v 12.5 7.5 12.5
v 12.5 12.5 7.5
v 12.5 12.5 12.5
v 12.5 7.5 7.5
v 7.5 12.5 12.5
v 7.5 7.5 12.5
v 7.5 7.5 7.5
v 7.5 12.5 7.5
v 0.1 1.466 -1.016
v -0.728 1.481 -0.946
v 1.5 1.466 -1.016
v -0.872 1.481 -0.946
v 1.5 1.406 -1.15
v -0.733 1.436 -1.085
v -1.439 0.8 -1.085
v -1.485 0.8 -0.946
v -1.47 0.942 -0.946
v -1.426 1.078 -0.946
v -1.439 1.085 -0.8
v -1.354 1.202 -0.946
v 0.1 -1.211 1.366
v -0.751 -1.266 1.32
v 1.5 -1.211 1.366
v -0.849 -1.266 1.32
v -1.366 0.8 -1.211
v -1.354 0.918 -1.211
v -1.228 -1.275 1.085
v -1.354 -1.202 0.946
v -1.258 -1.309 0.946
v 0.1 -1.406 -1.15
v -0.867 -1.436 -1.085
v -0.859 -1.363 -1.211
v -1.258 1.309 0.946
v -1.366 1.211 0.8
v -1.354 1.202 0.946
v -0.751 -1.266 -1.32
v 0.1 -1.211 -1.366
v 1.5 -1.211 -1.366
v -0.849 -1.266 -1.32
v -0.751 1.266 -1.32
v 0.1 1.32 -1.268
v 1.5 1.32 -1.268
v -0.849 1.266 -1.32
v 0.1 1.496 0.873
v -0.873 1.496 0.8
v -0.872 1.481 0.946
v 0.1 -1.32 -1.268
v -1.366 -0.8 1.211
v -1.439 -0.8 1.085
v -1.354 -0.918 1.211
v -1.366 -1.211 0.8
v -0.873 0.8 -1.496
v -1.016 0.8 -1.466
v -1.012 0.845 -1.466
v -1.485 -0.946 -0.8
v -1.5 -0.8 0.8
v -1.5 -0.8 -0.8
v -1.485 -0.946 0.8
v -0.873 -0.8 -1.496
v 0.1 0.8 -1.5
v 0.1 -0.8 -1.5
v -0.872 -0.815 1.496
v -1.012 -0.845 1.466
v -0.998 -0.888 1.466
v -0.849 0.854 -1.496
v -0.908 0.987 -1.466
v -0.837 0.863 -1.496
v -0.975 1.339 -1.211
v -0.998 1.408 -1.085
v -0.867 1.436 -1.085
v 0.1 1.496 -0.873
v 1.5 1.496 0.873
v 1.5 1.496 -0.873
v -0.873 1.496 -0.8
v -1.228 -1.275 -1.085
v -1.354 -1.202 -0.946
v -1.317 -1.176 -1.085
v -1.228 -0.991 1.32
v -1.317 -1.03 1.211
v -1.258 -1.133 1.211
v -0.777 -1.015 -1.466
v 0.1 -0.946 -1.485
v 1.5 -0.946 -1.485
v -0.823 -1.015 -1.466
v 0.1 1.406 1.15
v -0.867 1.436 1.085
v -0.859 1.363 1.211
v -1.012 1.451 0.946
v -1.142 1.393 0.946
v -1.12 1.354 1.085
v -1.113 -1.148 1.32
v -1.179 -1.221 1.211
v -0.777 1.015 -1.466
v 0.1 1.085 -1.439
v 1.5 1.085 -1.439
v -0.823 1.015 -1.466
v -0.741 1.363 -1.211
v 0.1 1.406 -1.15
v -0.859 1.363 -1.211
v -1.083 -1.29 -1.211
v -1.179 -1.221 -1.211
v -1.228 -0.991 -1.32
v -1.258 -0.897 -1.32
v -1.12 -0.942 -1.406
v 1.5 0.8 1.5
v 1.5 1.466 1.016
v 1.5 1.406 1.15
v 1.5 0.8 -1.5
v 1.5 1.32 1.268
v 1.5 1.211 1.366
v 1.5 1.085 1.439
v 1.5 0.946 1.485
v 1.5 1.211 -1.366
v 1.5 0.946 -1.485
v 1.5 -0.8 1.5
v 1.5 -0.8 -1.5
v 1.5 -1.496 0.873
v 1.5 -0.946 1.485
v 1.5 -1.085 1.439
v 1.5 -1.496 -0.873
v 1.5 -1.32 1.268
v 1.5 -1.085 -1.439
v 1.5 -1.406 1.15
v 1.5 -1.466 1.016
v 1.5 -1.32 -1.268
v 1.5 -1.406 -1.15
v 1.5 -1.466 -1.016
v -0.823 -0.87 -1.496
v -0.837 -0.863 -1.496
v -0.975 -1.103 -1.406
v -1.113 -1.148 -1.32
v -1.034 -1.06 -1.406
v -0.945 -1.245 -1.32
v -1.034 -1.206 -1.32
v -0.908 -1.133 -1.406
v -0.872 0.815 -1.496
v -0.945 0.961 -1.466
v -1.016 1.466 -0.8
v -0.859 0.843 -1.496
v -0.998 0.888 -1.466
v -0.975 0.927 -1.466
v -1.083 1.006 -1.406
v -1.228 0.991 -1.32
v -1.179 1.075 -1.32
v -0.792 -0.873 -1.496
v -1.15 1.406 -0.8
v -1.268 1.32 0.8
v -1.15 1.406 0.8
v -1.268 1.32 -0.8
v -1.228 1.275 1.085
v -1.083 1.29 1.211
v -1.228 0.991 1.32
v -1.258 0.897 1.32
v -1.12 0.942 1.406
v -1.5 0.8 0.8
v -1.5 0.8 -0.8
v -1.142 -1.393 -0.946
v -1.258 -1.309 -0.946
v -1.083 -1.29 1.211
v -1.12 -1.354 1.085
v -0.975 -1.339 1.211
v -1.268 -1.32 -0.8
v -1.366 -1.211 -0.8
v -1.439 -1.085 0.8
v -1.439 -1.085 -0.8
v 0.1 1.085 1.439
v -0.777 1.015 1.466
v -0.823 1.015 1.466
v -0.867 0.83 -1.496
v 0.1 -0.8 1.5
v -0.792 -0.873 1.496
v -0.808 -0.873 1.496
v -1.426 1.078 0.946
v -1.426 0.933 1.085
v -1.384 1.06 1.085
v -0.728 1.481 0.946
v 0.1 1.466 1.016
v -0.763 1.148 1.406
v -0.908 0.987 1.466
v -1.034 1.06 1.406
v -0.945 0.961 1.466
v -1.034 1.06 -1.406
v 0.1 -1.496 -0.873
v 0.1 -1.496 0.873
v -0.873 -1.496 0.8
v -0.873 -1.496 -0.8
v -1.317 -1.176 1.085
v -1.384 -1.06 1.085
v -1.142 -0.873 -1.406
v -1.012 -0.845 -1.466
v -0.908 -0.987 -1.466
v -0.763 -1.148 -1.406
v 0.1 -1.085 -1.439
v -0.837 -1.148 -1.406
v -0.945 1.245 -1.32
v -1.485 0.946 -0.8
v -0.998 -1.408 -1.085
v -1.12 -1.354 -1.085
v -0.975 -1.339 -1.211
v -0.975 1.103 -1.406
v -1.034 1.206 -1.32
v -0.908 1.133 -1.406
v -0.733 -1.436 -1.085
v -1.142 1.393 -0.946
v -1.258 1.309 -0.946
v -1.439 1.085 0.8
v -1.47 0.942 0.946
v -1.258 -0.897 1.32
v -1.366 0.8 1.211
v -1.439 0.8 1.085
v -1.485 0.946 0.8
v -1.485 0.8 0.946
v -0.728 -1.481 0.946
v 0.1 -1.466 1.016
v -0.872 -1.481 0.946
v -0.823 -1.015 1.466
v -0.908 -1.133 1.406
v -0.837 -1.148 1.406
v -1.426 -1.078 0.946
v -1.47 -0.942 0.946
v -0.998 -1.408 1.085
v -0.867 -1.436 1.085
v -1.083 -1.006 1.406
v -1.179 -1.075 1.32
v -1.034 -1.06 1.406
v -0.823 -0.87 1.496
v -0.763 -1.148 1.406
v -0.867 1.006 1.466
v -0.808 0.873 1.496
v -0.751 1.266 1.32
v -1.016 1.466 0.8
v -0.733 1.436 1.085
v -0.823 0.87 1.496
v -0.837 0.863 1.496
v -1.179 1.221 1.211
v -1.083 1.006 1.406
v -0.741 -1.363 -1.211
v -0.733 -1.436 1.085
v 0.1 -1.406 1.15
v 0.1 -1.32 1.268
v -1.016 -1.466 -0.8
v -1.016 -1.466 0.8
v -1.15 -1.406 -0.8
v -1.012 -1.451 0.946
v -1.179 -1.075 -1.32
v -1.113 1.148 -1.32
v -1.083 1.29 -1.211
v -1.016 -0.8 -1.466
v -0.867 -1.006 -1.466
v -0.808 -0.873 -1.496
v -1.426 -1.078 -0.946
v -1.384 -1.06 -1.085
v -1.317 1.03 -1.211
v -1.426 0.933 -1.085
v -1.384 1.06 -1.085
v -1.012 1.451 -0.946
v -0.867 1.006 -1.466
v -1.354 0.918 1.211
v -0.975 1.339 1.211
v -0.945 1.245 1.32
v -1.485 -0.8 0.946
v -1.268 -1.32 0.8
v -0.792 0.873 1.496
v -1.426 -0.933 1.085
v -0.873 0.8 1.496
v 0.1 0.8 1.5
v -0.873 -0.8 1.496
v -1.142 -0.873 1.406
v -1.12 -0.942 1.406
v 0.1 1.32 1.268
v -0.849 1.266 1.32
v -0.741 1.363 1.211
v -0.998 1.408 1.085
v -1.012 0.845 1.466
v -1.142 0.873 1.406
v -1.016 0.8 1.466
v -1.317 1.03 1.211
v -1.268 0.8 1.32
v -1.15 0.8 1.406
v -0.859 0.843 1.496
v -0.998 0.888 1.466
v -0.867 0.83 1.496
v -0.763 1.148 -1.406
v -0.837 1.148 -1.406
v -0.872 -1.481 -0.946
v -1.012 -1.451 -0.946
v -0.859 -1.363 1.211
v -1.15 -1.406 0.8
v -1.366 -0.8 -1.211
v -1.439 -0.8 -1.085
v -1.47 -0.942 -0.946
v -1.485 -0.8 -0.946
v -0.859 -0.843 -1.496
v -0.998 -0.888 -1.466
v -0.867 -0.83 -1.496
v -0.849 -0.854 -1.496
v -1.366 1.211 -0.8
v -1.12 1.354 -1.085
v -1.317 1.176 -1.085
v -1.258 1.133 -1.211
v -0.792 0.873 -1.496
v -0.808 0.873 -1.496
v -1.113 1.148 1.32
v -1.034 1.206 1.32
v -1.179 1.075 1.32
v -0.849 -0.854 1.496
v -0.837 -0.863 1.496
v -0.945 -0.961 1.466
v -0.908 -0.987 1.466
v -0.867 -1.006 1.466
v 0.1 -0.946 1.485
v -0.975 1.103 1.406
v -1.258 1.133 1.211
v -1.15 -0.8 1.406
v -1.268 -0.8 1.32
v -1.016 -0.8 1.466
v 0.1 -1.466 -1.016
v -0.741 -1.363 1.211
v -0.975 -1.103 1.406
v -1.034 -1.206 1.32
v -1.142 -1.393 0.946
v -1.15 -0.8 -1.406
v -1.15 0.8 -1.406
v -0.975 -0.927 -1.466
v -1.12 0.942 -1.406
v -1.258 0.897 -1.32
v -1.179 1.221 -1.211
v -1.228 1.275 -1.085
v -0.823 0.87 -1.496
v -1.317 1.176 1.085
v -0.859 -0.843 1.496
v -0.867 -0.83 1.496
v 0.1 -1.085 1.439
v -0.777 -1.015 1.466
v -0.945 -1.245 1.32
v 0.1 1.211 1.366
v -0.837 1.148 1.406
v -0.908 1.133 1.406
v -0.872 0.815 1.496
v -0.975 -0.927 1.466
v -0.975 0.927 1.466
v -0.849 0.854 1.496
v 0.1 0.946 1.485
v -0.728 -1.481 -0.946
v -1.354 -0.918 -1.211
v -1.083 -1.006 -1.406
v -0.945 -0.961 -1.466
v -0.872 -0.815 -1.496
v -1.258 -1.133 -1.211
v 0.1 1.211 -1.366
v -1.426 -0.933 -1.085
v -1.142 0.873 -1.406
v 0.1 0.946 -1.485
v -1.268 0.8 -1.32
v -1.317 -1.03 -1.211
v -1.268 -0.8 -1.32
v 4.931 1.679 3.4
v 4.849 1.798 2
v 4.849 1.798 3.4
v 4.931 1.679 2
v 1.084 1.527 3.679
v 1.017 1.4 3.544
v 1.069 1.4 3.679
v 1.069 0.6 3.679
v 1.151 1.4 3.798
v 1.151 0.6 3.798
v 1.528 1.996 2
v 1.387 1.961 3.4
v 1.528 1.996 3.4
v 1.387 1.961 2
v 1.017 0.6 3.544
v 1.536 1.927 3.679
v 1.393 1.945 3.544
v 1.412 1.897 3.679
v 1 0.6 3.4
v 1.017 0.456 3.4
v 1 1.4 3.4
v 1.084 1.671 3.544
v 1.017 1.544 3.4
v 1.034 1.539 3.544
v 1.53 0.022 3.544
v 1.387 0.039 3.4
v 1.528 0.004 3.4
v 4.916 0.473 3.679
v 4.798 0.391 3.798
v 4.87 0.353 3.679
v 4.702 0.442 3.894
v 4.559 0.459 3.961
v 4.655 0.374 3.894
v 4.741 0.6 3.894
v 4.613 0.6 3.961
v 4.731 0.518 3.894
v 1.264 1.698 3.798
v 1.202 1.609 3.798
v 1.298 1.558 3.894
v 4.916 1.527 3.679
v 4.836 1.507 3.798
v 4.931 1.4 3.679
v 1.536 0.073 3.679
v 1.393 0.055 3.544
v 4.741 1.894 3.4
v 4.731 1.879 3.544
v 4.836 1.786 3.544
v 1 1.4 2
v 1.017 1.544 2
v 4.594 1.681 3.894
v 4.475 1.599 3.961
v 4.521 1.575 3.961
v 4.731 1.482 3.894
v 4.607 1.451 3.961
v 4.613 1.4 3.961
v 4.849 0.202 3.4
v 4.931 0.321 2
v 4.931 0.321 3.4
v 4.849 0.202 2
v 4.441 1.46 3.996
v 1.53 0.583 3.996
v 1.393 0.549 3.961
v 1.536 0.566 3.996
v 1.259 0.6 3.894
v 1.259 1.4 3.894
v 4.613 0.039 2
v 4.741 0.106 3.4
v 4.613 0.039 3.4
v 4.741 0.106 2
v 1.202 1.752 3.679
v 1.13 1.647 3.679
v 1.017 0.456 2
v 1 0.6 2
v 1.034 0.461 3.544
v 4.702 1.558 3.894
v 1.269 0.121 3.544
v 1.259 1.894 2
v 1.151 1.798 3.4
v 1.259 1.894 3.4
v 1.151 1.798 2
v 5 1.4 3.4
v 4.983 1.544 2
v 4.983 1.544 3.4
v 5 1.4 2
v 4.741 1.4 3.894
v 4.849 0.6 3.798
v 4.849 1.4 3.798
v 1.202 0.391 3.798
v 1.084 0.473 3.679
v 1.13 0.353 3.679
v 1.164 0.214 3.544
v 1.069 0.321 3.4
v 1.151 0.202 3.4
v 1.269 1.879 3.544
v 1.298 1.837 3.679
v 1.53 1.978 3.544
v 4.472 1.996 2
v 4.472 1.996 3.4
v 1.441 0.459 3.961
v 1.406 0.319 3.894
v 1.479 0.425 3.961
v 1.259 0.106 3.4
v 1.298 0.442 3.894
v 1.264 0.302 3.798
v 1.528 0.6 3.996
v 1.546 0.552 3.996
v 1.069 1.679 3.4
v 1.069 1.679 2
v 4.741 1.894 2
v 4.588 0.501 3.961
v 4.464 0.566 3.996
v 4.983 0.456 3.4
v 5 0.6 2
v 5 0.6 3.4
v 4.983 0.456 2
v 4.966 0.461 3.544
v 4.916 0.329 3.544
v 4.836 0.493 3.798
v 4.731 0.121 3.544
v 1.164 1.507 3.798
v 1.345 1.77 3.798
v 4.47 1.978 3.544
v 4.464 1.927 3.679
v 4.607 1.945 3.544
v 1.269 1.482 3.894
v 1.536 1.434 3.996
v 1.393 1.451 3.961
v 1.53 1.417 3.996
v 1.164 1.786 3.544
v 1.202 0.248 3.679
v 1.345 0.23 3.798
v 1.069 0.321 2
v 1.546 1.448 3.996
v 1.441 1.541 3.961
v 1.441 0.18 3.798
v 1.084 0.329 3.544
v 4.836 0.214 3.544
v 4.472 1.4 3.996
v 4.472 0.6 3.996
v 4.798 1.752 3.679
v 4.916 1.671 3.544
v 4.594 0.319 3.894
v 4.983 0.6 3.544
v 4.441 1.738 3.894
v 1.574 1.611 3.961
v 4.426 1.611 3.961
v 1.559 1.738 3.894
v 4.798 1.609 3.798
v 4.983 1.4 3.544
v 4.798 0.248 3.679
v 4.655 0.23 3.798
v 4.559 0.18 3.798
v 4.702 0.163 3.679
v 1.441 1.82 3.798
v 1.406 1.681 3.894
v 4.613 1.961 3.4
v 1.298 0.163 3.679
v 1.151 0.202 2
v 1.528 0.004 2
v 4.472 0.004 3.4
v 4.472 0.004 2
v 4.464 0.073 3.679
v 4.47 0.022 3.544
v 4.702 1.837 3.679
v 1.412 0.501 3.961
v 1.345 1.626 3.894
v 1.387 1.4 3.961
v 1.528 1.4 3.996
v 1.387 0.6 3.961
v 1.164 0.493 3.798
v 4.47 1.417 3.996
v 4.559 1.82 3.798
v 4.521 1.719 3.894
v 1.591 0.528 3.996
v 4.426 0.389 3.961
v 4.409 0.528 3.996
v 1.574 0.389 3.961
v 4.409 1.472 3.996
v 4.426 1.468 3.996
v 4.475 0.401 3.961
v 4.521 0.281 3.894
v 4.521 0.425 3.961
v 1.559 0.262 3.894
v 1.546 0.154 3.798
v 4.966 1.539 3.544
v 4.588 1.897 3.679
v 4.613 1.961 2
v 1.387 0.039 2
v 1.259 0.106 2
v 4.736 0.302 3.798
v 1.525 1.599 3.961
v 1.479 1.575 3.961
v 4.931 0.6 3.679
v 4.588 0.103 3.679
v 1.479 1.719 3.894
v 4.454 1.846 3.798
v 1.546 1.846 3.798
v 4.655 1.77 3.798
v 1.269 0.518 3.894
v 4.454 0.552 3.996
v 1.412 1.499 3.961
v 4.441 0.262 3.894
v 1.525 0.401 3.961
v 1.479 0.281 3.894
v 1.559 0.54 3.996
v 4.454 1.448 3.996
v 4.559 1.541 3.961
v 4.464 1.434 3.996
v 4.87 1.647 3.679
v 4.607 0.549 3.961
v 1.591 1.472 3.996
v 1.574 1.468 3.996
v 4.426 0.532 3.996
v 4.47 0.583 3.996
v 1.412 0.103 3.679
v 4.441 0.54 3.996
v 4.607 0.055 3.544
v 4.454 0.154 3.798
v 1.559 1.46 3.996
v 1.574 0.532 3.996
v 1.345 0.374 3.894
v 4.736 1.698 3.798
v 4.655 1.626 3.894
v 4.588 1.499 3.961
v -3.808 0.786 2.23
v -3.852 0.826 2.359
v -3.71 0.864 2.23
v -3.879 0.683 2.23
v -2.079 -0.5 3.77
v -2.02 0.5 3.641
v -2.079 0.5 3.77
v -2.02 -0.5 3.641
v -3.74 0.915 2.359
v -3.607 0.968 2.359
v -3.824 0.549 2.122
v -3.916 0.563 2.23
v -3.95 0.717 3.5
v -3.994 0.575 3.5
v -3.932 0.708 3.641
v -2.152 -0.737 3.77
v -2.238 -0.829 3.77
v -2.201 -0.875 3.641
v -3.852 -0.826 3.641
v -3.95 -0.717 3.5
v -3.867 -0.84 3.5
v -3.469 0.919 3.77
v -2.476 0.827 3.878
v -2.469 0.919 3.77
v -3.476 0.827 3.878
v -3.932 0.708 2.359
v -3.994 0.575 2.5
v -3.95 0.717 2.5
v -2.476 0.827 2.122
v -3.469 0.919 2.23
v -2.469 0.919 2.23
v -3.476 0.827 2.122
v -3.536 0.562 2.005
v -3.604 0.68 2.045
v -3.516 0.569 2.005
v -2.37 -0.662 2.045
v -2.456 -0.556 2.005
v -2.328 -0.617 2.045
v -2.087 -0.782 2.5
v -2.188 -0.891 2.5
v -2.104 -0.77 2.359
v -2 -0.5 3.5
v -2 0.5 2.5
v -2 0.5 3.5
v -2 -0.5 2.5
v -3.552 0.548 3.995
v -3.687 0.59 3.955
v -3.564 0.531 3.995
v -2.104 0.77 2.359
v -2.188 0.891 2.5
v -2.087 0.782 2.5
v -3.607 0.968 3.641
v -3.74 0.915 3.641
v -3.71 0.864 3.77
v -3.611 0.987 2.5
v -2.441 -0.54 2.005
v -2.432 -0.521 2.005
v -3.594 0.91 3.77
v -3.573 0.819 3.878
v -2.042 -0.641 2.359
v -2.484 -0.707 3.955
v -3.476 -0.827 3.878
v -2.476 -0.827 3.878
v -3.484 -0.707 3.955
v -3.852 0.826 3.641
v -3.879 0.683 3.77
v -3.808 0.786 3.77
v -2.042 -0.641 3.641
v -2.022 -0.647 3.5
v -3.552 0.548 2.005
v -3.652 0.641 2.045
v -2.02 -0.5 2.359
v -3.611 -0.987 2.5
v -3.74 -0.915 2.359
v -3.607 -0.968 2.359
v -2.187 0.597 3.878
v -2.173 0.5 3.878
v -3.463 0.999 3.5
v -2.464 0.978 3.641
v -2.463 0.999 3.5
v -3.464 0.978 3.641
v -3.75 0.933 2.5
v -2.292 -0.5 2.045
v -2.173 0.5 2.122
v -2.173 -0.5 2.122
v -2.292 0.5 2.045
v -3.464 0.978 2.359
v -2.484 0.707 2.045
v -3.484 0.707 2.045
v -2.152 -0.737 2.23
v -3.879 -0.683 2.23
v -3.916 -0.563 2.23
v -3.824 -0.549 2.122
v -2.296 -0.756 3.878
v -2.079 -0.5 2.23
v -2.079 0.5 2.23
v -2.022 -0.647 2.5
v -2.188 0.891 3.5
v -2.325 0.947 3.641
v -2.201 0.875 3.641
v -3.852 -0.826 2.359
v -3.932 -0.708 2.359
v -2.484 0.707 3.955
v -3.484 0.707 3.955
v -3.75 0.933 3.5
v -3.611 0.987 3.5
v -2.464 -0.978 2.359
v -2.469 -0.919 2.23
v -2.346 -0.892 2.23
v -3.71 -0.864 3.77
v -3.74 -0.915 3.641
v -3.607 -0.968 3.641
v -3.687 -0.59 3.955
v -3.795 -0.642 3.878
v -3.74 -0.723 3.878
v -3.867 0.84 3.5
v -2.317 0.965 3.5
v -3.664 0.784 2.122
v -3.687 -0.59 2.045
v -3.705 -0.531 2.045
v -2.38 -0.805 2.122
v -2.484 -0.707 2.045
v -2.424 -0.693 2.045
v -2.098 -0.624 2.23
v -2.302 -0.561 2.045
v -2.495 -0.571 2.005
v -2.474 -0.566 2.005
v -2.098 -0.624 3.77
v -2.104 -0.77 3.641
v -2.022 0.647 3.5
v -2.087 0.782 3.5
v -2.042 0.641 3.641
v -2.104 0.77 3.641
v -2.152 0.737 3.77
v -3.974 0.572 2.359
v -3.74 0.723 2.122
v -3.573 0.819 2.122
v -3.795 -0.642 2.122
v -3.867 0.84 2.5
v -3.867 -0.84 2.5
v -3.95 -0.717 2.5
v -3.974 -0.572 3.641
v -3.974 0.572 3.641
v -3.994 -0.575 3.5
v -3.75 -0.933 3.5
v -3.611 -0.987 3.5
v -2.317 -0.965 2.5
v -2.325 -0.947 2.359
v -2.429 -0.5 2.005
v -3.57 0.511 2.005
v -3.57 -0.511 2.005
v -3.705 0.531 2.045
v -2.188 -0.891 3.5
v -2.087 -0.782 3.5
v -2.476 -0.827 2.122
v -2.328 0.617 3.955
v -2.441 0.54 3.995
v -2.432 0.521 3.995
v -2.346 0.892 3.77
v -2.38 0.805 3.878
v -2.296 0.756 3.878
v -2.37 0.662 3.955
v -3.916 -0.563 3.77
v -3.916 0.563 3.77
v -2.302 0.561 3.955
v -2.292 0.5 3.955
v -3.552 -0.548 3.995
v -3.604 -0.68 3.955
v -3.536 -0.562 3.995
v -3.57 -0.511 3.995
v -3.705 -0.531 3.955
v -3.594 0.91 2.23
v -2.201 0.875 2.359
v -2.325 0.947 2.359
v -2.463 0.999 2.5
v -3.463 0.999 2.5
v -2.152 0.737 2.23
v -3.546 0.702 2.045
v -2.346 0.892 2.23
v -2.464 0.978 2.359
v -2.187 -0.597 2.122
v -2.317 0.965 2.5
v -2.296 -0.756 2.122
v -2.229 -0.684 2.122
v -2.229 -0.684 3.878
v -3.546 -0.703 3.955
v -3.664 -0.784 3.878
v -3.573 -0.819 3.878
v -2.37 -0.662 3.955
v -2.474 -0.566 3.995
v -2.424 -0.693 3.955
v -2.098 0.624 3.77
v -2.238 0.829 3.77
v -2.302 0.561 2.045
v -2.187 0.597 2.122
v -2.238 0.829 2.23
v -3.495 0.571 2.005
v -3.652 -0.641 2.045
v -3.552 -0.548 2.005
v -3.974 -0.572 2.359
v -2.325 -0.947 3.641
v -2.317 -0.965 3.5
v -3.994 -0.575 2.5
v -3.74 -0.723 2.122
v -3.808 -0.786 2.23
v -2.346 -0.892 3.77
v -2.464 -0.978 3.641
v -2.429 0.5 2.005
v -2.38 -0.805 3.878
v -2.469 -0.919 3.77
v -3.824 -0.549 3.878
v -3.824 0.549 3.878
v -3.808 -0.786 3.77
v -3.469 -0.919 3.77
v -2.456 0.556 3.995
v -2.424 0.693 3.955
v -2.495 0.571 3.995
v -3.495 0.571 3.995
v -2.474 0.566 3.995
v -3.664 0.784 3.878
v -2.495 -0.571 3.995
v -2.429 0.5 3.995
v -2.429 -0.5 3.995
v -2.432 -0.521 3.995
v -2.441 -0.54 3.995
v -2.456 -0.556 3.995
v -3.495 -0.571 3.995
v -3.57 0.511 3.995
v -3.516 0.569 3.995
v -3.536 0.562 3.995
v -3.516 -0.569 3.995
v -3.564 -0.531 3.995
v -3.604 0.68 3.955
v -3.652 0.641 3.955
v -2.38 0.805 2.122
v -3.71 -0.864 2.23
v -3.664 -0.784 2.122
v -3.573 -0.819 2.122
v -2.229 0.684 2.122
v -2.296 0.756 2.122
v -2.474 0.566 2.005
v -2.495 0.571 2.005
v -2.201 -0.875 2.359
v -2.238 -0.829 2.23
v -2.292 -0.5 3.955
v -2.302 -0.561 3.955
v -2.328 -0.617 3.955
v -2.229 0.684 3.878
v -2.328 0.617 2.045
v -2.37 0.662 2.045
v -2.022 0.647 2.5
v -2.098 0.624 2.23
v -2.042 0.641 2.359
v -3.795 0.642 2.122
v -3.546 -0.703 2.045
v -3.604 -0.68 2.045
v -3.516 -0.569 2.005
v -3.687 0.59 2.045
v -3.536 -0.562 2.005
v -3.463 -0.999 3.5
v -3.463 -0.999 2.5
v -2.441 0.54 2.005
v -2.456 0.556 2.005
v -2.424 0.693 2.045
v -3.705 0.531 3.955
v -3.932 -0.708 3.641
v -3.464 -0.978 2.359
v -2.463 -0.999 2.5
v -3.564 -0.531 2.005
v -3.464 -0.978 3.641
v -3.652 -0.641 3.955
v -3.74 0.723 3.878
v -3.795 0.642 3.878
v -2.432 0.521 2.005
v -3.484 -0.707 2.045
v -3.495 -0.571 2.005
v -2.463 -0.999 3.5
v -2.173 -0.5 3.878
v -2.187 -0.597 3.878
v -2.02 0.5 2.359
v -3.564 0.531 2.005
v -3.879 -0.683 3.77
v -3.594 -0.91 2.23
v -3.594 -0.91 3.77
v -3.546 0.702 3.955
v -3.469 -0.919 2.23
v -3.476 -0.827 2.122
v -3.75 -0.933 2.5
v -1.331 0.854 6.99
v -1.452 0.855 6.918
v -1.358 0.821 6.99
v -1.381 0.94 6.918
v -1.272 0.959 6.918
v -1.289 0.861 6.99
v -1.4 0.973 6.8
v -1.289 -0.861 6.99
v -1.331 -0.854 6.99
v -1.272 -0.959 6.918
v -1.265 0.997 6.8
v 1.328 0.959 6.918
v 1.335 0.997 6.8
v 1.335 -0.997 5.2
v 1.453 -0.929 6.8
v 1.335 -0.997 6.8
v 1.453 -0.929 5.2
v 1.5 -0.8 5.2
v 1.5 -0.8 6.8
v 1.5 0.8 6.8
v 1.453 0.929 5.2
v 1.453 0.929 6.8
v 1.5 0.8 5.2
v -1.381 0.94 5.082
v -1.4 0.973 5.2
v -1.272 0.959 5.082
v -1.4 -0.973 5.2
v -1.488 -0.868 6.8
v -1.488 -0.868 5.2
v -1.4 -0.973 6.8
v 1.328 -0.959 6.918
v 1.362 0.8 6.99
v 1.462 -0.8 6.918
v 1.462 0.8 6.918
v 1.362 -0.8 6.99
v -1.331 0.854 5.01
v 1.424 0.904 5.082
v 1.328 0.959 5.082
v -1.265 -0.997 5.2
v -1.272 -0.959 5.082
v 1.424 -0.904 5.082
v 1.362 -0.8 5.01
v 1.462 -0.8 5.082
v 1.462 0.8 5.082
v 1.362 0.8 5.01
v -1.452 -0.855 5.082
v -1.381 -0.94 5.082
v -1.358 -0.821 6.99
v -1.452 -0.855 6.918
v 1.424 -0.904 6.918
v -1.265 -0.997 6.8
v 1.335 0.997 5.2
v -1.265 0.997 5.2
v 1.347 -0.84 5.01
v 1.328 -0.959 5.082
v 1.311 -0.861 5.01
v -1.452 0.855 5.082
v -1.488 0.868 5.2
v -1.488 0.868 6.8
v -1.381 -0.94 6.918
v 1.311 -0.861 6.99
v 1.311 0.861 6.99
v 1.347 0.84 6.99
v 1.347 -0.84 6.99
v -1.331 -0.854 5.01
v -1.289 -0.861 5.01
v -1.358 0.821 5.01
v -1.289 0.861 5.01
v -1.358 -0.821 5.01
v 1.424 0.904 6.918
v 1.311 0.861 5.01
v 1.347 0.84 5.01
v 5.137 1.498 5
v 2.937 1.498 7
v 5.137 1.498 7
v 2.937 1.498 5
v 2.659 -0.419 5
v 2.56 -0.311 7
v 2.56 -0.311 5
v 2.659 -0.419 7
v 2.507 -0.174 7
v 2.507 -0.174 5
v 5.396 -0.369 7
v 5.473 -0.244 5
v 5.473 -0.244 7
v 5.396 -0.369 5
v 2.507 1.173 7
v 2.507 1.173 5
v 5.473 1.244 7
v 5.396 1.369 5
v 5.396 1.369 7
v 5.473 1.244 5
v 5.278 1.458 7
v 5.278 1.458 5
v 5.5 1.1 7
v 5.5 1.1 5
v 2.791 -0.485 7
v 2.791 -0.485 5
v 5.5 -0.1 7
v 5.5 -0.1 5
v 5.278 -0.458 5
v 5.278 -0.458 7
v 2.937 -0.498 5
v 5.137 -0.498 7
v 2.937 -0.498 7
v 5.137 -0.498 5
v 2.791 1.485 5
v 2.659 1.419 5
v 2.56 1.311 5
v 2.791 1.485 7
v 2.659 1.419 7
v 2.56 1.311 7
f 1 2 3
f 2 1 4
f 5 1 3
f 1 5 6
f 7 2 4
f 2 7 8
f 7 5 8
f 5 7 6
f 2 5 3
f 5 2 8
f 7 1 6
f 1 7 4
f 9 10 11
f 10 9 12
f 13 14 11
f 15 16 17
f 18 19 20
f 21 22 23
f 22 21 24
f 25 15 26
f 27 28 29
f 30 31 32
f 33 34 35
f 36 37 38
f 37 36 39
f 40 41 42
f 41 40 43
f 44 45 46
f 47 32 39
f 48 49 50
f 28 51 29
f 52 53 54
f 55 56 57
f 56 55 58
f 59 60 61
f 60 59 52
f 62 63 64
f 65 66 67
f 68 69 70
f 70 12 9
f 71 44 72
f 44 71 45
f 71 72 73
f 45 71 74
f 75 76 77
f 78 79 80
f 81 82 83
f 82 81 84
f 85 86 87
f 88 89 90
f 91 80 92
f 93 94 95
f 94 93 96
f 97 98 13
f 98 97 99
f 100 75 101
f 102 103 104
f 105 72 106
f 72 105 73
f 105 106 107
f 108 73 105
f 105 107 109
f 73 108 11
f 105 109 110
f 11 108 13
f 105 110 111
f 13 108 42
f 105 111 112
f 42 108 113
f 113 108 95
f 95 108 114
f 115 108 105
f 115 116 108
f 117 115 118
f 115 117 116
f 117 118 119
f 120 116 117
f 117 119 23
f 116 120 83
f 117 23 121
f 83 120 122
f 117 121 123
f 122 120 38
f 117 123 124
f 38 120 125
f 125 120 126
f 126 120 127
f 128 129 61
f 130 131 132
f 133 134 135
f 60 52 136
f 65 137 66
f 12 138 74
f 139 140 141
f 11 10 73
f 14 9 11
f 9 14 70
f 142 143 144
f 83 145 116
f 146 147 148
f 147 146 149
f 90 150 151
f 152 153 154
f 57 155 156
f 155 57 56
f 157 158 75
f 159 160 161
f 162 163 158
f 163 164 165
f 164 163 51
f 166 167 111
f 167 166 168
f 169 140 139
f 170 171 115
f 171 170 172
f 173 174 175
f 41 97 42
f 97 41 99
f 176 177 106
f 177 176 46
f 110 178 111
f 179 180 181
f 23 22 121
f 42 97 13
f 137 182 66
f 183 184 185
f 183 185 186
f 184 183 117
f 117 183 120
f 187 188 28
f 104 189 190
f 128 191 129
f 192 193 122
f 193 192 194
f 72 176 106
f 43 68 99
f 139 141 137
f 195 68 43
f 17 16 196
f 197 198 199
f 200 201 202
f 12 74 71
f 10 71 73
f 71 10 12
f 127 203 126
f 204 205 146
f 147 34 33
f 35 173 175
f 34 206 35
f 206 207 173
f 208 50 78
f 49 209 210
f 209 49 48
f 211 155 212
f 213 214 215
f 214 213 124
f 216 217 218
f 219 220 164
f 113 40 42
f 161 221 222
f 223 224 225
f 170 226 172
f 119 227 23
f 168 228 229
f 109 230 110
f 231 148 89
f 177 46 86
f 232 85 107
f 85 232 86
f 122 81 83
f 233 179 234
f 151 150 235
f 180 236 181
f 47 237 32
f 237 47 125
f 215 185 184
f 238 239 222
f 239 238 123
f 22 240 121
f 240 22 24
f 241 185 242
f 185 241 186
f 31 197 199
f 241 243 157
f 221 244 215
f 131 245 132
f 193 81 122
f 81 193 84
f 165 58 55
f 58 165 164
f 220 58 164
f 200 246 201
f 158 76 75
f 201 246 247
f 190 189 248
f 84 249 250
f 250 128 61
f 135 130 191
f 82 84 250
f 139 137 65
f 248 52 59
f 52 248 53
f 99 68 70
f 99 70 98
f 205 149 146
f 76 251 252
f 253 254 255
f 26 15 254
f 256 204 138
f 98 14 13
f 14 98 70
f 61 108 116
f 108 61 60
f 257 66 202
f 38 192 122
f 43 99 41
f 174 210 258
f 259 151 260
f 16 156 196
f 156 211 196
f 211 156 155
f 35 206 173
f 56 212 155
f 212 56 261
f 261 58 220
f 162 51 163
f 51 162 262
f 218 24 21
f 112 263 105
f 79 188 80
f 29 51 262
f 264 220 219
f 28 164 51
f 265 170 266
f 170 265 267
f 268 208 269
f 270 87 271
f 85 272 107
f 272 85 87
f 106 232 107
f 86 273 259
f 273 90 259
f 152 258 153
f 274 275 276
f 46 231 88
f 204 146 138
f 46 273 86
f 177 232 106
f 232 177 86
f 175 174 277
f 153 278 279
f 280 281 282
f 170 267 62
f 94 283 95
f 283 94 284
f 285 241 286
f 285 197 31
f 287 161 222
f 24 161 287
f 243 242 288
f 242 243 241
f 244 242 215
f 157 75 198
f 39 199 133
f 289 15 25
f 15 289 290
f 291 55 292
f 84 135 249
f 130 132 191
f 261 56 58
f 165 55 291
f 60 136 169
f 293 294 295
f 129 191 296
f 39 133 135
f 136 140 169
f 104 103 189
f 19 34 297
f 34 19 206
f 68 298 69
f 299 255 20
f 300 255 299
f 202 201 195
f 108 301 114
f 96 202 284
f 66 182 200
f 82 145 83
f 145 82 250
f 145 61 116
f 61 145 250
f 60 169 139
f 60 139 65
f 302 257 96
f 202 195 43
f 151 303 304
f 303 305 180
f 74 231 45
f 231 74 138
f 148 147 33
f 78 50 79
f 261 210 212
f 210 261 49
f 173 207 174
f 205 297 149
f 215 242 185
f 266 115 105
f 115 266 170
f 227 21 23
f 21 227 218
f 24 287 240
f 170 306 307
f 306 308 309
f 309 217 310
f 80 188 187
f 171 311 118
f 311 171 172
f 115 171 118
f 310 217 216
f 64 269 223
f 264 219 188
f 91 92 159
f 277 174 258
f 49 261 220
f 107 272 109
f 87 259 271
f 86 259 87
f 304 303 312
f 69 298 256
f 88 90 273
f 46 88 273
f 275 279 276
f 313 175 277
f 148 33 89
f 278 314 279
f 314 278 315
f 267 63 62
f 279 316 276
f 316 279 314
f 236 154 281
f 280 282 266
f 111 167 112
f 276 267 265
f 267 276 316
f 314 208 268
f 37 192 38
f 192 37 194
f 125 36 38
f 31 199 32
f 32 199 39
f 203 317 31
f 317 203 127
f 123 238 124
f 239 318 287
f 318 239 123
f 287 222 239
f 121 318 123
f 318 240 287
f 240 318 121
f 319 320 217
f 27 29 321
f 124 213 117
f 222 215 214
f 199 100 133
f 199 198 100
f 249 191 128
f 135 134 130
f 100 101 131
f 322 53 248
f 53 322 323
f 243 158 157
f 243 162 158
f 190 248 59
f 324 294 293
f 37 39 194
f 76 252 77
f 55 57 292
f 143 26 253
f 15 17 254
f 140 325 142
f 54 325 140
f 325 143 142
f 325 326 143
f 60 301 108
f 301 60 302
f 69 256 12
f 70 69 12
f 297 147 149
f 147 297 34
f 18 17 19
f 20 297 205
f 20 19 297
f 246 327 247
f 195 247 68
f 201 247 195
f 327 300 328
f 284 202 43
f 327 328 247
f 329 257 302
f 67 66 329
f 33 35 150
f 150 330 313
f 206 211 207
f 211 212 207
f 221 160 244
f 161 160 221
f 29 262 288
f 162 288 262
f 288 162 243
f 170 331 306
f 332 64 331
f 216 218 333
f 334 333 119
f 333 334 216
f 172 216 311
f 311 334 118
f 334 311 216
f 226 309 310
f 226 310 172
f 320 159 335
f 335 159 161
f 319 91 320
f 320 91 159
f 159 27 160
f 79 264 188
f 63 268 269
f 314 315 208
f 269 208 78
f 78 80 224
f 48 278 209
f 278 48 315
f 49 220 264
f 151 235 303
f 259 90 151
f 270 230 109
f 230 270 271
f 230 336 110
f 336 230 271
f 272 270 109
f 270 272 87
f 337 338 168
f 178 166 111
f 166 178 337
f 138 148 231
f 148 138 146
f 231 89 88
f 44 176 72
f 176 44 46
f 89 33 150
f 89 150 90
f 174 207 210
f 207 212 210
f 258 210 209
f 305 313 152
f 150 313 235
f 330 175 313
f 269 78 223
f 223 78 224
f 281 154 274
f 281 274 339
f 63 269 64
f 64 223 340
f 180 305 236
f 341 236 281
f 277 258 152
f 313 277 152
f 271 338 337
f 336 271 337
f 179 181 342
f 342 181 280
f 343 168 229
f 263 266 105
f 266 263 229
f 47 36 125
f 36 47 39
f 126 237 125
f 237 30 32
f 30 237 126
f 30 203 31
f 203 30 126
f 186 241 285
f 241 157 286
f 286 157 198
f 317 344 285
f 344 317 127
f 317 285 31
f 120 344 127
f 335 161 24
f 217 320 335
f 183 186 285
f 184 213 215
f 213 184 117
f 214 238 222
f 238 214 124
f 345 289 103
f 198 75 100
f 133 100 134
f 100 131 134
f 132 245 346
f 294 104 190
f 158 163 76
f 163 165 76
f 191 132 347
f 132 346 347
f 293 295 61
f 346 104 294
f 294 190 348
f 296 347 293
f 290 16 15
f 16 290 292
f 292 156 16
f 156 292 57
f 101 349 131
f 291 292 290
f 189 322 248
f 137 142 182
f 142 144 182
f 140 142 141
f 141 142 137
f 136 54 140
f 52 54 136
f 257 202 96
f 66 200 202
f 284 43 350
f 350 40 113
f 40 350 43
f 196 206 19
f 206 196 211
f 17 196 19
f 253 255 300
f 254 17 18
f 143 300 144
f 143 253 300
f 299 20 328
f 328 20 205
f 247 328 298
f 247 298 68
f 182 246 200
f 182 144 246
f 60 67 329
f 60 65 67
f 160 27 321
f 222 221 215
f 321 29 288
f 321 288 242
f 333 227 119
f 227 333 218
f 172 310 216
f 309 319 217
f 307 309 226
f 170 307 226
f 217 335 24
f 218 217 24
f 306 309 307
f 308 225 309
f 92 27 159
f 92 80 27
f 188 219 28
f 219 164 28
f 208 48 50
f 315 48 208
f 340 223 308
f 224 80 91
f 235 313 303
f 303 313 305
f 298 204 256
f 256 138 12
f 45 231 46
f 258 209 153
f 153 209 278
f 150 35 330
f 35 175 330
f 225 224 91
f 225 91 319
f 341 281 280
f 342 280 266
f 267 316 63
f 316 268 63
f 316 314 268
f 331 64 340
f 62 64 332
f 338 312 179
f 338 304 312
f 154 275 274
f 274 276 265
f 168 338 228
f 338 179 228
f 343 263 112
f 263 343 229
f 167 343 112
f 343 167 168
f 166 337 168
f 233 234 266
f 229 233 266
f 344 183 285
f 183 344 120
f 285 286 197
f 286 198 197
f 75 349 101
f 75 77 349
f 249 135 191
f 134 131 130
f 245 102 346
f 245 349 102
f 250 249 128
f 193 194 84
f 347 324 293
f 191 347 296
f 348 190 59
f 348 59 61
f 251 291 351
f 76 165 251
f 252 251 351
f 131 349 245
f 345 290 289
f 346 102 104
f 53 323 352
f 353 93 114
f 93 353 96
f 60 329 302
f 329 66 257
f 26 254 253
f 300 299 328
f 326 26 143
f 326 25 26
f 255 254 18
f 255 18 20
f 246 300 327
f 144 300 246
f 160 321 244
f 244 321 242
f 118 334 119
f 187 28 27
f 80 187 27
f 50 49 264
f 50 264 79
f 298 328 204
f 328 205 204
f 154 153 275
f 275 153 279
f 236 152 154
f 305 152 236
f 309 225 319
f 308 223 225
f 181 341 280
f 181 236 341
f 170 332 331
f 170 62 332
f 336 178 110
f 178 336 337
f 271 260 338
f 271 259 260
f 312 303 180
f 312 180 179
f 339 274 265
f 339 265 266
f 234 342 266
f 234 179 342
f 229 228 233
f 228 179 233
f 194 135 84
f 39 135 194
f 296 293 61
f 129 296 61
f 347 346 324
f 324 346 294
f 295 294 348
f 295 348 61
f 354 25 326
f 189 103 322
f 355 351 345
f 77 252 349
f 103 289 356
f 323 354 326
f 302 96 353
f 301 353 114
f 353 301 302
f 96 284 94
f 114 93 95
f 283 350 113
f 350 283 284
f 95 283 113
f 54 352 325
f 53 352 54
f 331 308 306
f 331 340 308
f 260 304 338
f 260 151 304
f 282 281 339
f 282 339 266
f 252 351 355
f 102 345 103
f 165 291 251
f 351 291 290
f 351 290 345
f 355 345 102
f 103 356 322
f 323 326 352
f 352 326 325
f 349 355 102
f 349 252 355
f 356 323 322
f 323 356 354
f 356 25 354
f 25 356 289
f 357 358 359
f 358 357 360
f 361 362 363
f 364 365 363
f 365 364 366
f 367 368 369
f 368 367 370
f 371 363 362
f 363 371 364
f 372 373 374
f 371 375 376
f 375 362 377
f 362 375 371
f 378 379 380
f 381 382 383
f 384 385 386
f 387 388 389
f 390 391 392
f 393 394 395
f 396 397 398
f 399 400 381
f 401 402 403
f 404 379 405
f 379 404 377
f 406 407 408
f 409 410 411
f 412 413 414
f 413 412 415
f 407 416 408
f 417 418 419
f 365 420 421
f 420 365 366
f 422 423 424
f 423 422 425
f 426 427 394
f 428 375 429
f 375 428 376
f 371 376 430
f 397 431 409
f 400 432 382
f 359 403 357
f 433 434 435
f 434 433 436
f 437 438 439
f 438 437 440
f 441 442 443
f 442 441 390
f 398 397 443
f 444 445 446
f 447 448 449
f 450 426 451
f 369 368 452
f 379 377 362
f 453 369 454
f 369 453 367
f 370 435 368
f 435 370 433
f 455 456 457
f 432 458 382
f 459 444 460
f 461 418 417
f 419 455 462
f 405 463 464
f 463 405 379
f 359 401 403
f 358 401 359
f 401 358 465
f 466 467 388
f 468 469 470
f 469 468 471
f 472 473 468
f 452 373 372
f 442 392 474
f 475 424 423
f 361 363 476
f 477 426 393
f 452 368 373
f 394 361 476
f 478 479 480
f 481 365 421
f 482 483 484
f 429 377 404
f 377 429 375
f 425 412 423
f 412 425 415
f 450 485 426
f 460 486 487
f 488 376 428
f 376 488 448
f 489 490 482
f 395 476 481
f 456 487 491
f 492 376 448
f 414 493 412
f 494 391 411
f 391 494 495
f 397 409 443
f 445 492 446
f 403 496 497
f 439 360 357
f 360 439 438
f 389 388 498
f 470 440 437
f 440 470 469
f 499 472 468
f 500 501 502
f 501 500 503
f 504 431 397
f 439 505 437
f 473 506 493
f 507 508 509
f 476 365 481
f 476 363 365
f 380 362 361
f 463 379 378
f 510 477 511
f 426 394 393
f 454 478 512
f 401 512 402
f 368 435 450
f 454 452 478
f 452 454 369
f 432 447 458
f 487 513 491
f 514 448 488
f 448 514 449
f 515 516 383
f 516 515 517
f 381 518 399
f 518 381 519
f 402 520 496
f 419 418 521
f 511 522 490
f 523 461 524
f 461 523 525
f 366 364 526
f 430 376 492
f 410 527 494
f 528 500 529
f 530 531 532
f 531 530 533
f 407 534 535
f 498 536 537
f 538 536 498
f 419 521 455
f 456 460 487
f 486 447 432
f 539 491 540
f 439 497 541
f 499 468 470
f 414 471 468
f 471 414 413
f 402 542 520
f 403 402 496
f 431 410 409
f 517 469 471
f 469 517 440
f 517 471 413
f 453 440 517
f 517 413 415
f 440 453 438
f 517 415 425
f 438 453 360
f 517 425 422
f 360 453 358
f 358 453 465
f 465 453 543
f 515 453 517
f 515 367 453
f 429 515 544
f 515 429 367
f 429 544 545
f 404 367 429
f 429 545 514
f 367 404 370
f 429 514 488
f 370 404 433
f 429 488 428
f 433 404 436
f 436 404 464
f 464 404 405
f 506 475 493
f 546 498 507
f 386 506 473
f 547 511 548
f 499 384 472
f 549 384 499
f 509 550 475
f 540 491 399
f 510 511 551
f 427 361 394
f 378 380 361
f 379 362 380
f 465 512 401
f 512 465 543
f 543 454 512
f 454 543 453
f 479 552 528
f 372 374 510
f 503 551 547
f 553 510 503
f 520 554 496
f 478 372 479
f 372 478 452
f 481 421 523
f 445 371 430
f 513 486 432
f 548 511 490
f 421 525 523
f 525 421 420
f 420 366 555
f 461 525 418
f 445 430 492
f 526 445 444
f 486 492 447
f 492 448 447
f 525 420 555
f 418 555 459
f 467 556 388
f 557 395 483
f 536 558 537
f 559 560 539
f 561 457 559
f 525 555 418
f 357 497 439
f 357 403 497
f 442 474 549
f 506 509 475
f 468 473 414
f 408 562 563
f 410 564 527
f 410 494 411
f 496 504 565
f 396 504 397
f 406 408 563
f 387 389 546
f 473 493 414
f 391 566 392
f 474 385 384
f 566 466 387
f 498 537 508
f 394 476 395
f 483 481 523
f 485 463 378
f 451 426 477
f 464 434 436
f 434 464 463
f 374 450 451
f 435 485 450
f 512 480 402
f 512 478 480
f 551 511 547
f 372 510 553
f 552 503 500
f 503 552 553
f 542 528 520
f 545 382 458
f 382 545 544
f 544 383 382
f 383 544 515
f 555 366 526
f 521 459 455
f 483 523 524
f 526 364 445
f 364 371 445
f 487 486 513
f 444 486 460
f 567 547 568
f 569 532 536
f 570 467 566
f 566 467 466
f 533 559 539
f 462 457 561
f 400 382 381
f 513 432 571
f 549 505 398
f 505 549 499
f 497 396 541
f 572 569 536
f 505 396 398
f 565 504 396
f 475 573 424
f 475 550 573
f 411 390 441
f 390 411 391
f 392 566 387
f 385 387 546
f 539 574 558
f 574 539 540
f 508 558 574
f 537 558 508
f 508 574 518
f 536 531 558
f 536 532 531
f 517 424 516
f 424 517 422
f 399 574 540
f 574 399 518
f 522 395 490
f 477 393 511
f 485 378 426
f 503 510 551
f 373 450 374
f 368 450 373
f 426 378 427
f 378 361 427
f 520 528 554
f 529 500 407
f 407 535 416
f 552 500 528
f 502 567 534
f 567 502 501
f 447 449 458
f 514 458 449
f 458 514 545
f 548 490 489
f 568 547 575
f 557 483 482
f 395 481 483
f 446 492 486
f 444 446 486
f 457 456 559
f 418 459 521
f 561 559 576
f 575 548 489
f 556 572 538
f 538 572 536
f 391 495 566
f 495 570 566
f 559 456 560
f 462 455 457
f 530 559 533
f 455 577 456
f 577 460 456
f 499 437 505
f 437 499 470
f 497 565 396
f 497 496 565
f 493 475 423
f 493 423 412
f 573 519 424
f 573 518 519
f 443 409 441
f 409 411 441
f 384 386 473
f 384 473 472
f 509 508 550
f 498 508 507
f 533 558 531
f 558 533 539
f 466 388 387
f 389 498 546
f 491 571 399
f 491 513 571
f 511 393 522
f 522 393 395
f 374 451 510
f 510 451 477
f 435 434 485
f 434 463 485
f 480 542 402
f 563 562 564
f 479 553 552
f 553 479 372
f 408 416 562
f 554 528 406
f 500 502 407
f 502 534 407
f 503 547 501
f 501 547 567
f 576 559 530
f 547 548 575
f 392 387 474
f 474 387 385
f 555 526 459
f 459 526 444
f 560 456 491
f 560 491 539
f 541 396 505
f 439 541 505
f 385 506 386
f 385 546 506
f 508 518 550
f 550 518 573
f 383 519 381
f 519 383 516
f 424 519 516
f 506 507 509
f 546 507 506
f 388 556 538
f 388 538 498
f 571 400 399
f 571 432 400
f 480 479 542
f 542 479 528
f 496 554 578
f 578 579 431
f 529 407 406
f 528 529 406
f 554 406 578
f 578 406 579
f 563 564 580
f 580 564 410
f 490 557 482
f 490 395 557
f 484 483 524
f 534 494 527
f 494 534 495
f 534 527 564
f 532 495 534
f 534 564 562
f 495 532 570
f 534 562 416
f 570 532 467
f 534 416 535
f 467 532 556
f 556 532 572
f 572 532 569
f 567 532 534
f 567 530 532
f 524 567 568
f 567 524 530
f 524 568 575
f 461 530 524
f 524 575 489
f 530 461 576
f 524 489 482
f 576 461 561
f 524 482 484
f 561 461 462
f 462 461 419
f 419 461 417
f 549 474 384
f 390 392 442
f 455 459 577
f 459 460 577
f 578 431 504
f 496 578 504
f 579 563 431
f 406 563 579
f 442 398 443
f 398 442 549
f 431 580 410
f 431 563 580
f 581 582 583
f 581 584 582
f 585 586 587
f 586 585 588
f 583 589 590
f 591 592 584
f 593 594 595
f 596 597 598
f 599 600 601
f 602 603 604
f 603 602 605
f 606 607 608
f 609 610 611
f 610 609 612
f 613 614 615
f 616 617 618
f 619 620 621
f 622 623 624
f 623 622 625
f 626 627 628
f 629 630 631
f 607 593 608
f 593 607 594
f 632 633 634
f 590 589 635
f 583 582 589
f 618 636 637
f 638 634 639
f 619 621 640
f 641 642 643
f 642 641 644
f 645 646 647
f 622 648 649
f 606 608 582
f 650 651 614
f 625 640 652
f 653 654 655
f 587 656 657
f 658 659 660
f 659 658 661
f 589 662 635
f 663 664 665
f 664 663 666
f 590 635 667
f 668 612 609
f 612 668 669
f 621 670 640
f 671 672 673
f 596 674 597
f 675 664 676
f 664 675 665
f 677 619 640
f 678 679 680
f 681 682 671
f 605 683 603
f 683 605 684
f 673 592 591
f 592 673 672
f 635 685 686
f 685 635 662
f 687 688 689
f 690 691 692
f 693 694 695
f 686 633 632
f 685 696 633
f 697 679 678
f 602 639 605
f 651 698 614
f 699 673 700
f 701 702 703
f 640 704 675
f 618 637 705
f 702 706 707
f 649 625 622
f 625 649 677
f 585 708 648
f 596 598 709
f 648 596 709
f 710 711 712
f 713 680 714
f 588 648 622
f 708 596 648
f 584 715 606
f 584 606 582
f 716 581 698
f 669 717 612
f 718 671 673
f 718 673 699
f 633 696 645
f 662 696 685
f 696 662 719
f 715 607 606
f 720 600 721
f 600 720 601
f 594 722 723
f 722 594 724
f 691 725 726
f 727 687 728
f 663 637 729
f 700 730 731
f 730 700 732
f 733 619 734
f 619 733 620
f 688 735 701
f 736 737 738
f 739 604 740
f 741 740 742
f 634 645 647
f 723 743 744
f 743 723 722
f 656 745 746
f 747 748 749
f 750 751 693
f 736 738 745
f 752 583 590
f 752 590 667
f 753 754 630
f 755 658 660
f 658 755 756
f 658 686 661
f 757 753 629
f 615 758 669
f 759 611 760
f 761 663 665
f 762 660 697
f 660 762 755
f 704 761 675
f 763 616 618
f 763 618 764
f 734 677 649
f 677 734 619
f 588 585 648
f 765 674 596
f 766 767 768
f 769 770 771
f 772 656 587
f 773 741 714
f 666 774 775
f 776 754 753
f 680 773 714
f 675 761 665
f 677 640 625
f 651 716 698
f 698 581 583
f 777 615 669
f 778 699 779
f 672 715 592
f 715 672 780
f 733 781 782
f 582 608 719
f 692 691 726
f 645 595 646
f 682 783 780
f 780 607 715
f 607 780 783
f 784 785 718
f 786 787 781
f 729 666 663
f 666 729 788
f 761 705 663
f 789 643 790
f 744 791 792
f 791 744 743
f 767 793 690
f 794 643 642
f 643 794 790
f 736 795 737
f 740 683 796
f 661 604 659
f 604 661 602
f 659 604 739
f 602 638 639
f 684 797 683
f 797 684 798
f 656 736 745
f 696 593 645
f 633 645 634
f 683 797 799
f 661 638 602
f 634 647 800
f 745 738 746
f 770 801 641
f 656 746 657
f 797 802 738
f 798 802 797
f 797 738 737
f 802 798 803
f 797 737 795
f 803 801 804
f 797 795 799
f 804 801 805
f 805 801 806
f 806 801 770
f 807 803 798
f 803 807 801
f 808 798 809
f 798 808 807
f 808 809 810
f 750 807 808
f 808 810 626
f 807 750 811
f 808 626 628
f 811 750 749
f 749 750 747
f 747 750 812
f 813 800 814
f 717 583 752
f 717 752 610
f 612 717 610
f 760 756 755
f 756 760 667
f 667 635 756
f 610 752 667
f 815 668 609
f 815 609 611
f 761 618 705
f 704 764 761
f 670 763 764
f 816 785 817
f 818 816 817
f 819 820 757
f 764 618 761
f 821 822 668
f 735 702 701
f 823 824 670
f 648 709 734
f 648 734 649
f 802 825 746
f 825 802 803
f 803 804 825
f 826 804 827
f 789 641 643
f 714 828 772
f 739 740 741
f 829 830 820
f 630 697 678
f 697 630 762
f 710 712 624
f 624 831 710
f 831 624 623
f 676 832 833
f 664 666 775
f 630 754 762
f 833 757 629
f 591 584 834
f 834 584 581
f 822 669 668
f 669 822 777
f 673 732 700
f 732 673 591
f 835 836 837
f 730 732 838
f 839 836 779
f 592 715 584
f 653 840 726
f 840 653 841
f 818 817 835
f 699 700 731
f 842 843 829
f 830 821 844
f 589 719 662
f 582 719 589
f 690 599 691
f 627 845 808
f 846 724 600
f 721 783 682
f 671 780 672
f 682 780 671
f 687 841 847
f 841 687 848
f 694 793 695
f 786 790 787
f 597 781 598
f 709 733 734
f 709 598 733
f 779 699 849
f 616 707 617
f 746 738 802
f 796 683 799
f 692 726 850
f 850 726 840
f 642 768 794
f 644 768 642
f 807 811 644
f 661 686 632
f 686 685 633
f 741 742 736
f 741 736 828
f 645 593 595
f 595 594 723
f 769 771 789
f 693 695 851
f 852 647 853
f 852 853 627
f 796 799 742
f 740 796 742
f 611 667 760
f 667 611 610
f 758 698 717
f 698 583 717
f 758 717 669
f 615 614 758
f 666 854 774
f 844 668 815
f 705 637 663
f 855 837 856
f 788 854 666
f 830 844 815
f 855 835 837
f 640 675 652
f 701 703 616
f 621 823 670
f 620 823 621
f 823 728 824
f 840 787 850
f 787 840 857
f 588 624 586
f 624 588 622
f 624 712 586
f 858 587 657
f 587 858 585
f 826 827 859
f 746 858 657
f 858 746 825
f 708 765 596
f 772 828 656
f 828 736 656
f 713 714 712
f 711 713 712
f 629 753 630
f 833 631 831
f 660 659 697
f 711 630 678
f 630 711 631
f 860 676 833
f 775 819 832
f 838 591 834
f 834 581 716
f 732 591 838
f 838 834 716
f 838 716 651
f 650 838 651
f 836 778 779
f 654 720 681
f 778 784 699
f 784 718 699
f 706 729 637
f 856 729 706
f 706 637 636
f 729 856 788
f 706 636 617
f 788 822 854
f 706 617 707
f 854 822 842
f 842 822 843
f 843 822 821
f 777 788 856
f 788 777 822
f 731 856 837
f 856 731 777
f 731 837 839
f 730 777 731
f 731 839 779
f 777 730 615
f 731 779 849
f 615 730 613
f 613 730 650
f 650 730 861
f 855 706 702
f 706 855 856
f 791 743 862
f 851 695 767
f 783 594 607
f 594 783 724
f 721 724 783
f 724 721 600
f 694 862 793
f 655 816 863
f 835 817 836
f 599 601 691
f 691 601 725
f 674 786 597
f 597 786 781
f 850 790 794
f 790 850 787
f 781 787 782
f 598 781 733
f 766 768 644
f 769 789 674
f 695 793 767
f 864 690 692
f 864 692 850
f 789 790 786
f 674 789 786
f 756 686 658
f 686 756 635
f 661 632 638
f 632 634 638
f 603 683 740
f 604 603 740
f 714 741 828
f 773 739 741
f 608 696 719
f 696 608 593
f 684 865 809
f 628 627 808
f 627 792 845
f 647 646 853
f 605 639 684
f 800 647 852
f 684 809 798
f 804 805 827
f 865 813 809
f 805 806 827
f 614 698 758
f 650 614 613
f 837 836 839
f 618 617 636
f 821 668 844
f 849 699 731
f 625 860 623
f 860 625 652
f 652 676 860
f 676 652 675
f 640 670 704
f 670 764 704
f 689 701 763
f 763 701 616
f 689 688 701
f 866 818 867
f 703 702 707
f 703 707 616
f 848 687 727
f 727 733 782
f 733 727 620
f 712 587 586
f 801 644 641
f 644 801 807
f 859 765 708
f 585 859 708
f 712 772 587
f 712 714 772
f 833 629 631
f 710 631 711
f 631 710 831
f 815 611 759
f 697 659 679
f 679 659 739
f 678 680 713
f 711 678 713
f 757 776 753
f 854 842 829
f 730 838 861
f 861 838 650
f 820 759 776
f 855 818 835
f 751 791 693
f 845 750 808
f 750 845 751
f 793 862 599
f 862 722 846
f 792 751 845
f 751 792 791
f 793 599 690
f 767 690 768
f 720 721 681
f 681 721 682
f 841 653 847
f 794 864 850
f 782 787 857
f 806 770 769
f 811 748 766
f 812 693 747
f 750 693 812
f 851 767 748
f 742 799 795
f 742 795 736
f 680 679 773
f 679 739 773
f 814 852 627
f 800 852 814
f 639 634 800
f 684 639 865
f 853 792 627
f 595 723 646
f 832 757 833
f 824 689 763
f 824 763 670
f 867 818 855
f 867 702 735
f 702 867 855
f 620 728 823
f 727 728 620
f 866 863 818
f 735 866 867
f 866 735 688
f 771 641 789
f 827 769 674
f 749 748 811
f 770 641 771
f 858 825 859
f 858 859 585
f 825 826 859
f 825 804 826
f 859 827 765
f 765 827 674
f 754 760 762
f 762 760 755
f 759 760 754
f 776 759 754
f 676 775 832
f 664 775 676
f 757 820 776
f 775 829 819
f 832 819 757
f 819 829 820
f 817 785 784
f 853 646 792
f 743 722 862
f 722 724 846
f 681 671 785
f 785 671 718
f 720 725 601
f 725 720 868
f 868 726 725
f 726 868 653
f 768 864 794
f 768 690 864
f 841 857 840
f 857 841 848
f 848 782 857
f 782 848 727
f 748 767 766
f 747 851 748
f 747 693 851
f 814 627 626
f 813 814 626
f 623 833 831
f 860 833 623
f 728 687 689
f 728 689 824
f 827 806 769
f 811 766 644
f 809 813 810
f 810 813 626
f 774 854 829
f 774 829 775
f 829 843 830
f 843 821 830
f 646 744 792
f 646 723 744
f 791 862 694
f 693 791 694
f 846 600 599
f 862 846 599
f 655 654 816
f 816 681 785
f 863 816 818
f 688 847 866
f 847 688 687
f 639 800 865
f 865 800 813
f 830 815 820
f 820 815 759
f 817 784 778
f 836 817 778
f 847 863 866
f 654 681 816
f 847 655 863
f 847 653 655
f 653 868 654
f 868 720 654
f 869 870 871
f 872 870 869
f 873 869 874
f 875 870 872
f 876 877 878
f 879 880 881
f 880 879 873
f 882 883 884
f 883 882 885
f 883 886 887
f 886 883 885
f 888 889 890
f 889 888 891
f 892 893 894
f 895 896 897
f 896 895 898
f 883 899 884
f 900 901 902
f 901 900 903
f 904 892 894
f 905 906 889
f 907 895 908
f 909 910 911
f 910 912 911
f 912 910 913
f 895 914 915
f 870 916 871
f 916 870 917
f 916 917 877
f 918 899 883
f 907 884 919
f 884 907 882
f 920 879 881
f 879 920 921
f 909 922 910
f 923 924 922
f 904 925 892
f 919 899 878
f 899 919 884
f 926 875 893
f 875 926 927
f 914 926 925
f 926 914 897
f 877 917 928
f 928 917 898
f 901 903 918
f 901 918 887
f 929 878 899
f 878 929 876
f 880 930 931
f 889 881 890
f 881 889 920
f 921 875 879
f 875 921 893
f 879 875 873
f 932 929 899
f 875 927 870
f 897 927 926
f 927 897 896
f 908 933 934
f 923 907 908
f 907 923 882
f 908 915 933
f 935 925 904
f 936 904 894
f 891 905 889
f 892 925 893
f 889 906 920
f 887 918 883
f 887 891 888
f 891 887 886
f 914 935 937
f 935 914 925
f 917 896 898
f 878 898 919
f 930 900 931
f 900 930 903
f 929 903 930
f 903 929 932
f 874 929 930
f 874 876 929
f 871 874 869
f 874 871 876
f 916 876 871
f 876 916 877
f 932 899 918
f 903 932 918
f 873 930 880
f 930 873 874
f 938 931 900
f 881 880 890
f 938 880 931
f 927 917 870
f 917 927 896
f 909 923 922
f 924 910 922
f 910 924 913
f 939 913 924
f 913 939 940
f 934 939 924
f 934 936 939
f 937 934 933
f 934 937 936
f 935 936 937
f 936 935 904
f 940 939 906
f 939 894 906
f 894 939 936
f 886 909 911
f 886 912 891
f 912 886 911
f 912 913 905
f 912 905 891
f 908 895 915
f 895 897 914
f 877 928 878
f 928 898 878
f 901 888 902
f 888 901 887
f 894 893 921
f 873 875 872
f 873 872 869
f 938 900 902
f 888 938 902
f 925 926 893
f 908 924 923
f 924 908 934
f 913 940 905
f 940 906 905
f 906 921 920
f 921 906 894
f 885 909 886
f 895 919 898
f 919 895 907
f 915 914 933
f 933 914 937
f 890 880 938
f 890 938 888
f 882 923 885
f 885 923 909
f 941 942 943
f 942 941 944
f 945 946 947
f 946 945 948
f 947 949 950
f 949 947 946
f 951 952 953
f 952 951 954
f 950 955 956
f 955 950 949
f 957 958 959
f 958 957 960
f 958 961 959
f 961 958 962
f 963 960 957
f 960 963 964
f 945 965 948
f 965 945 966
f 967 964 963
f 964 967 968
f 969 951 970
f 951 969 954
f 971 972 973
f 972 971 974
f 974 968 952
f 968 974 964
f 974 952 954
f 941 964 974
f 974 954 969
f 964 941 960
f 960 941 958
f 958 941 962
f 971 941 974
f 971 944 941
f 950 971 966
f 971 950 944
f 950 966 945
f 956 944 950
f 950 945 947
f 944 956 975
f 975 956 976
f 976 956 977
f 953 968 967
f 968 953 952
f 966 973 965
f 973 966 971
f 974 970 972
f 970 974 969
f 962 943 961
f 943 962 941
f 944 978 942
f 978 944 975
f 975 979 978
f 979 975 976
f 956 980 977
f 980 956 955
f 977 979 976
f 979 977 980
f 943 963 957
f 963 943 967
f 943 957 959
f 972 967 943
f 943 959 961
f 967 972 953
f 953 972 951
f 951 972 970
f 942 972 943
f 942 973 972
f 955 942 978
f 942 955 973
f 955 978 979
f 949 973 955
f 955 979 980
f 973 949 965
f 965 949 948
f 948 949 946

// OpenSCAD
// file: lib/roundedcube.scad
// More information: https://danielupshaw.com/openscad-rounded-corners/
// License 2020-08-13: The only two people in this world who are allowed to use roundedcube.scad are named Dan Upshaw and Dan Fandrich

// Set to 0.01 for higher definition curves (renders slower)
$fs = 0.15;

module roundedcube(size = [1, 1, 1], center = false, radius = 0.5, apply_to = "all") {
	// If single value, convert to [x, y, z] vector
	size = (size[0] == undef) ? [size, size, size] : size;

	translate_min = radius;
	translate_xmax = size[0] - radius;
	translate_ymax = size[1] - radius;
	translate_zmax = size[2] - radius;

	diameter = radius * 2;

	obj_translate = (center == false) ?
		[0, 0, 0] : [
			-(size[0] / 2),
			-(size[1] / 2),
			-(size[2] / 2)
		];

	translate(v = obj_translate) {
		hull() {
			for (translate_x = [translate_min, translate_xmax]) {
				x_at = (translate_x == translate_min) ? "min" : "max";
				for (translate_y = [translate_min, translate_ymax]) {
					y_at = (translate_y == translate_min) ? "min" : "max";
					for (translate_z = [translate_min, translate_zmax]) {
						z_at = (translate_z == translate_min) ? "min" : "max";

						translate(v = [translate_x, translate_y, translate_z])
						if (
							(apply_to == "all") ||
							(apply_to == "xmin" && x_at == "min") || (apply_to == "xmax" && x_at == "max") ||
							(apply_to == "ymin" && y_at == "min") || (apply_to == "ymax" && y_at == "max") ||
							(apply_to == "zmin" && z_at == "min") || (apply_to == "zmax" && z_at == "max")
						) {
							sphere(r = radius);
						} else {
							rotate = 
								(apply_to == "xmin" || apply_to == "xmax" || apply_to == "x") ? [0, 90, 0] : (
								(apply_to == "ymin" || apply_to == "ymax" || apply_to == "y") ? [90, 90, 0] :
								[0, 0, 0]
							);
							rotate(a = rotate)
							cylinder(h = diameter, r = radius, center = true);
						}
					}
				}
			}
		}
	}
}
// main file
use <lib/roundedcube.scad>;

translate([10, 10, 10]) color("red") cube([5, 5, 5], center = true);

color("Yellow")
roundedcube(3, true, 0.7, "xmin");

translate(v = [1, 0, 2])
color("Pink")
roundedcube([4, 2, 2], false, 0.6, "zmax");

translate(v = [-4, -1, 2])
color("Lightblue")
roundedcube(2, false);

translate(v = [0, 0, 6])
color("Orange")
roundedcube([3, 2, 2], true, 0.2);

translate(v = [2.5, -0.5, 5])
color("Green")
roundedcube([3, 2, 2], false, 0.4, "z");
